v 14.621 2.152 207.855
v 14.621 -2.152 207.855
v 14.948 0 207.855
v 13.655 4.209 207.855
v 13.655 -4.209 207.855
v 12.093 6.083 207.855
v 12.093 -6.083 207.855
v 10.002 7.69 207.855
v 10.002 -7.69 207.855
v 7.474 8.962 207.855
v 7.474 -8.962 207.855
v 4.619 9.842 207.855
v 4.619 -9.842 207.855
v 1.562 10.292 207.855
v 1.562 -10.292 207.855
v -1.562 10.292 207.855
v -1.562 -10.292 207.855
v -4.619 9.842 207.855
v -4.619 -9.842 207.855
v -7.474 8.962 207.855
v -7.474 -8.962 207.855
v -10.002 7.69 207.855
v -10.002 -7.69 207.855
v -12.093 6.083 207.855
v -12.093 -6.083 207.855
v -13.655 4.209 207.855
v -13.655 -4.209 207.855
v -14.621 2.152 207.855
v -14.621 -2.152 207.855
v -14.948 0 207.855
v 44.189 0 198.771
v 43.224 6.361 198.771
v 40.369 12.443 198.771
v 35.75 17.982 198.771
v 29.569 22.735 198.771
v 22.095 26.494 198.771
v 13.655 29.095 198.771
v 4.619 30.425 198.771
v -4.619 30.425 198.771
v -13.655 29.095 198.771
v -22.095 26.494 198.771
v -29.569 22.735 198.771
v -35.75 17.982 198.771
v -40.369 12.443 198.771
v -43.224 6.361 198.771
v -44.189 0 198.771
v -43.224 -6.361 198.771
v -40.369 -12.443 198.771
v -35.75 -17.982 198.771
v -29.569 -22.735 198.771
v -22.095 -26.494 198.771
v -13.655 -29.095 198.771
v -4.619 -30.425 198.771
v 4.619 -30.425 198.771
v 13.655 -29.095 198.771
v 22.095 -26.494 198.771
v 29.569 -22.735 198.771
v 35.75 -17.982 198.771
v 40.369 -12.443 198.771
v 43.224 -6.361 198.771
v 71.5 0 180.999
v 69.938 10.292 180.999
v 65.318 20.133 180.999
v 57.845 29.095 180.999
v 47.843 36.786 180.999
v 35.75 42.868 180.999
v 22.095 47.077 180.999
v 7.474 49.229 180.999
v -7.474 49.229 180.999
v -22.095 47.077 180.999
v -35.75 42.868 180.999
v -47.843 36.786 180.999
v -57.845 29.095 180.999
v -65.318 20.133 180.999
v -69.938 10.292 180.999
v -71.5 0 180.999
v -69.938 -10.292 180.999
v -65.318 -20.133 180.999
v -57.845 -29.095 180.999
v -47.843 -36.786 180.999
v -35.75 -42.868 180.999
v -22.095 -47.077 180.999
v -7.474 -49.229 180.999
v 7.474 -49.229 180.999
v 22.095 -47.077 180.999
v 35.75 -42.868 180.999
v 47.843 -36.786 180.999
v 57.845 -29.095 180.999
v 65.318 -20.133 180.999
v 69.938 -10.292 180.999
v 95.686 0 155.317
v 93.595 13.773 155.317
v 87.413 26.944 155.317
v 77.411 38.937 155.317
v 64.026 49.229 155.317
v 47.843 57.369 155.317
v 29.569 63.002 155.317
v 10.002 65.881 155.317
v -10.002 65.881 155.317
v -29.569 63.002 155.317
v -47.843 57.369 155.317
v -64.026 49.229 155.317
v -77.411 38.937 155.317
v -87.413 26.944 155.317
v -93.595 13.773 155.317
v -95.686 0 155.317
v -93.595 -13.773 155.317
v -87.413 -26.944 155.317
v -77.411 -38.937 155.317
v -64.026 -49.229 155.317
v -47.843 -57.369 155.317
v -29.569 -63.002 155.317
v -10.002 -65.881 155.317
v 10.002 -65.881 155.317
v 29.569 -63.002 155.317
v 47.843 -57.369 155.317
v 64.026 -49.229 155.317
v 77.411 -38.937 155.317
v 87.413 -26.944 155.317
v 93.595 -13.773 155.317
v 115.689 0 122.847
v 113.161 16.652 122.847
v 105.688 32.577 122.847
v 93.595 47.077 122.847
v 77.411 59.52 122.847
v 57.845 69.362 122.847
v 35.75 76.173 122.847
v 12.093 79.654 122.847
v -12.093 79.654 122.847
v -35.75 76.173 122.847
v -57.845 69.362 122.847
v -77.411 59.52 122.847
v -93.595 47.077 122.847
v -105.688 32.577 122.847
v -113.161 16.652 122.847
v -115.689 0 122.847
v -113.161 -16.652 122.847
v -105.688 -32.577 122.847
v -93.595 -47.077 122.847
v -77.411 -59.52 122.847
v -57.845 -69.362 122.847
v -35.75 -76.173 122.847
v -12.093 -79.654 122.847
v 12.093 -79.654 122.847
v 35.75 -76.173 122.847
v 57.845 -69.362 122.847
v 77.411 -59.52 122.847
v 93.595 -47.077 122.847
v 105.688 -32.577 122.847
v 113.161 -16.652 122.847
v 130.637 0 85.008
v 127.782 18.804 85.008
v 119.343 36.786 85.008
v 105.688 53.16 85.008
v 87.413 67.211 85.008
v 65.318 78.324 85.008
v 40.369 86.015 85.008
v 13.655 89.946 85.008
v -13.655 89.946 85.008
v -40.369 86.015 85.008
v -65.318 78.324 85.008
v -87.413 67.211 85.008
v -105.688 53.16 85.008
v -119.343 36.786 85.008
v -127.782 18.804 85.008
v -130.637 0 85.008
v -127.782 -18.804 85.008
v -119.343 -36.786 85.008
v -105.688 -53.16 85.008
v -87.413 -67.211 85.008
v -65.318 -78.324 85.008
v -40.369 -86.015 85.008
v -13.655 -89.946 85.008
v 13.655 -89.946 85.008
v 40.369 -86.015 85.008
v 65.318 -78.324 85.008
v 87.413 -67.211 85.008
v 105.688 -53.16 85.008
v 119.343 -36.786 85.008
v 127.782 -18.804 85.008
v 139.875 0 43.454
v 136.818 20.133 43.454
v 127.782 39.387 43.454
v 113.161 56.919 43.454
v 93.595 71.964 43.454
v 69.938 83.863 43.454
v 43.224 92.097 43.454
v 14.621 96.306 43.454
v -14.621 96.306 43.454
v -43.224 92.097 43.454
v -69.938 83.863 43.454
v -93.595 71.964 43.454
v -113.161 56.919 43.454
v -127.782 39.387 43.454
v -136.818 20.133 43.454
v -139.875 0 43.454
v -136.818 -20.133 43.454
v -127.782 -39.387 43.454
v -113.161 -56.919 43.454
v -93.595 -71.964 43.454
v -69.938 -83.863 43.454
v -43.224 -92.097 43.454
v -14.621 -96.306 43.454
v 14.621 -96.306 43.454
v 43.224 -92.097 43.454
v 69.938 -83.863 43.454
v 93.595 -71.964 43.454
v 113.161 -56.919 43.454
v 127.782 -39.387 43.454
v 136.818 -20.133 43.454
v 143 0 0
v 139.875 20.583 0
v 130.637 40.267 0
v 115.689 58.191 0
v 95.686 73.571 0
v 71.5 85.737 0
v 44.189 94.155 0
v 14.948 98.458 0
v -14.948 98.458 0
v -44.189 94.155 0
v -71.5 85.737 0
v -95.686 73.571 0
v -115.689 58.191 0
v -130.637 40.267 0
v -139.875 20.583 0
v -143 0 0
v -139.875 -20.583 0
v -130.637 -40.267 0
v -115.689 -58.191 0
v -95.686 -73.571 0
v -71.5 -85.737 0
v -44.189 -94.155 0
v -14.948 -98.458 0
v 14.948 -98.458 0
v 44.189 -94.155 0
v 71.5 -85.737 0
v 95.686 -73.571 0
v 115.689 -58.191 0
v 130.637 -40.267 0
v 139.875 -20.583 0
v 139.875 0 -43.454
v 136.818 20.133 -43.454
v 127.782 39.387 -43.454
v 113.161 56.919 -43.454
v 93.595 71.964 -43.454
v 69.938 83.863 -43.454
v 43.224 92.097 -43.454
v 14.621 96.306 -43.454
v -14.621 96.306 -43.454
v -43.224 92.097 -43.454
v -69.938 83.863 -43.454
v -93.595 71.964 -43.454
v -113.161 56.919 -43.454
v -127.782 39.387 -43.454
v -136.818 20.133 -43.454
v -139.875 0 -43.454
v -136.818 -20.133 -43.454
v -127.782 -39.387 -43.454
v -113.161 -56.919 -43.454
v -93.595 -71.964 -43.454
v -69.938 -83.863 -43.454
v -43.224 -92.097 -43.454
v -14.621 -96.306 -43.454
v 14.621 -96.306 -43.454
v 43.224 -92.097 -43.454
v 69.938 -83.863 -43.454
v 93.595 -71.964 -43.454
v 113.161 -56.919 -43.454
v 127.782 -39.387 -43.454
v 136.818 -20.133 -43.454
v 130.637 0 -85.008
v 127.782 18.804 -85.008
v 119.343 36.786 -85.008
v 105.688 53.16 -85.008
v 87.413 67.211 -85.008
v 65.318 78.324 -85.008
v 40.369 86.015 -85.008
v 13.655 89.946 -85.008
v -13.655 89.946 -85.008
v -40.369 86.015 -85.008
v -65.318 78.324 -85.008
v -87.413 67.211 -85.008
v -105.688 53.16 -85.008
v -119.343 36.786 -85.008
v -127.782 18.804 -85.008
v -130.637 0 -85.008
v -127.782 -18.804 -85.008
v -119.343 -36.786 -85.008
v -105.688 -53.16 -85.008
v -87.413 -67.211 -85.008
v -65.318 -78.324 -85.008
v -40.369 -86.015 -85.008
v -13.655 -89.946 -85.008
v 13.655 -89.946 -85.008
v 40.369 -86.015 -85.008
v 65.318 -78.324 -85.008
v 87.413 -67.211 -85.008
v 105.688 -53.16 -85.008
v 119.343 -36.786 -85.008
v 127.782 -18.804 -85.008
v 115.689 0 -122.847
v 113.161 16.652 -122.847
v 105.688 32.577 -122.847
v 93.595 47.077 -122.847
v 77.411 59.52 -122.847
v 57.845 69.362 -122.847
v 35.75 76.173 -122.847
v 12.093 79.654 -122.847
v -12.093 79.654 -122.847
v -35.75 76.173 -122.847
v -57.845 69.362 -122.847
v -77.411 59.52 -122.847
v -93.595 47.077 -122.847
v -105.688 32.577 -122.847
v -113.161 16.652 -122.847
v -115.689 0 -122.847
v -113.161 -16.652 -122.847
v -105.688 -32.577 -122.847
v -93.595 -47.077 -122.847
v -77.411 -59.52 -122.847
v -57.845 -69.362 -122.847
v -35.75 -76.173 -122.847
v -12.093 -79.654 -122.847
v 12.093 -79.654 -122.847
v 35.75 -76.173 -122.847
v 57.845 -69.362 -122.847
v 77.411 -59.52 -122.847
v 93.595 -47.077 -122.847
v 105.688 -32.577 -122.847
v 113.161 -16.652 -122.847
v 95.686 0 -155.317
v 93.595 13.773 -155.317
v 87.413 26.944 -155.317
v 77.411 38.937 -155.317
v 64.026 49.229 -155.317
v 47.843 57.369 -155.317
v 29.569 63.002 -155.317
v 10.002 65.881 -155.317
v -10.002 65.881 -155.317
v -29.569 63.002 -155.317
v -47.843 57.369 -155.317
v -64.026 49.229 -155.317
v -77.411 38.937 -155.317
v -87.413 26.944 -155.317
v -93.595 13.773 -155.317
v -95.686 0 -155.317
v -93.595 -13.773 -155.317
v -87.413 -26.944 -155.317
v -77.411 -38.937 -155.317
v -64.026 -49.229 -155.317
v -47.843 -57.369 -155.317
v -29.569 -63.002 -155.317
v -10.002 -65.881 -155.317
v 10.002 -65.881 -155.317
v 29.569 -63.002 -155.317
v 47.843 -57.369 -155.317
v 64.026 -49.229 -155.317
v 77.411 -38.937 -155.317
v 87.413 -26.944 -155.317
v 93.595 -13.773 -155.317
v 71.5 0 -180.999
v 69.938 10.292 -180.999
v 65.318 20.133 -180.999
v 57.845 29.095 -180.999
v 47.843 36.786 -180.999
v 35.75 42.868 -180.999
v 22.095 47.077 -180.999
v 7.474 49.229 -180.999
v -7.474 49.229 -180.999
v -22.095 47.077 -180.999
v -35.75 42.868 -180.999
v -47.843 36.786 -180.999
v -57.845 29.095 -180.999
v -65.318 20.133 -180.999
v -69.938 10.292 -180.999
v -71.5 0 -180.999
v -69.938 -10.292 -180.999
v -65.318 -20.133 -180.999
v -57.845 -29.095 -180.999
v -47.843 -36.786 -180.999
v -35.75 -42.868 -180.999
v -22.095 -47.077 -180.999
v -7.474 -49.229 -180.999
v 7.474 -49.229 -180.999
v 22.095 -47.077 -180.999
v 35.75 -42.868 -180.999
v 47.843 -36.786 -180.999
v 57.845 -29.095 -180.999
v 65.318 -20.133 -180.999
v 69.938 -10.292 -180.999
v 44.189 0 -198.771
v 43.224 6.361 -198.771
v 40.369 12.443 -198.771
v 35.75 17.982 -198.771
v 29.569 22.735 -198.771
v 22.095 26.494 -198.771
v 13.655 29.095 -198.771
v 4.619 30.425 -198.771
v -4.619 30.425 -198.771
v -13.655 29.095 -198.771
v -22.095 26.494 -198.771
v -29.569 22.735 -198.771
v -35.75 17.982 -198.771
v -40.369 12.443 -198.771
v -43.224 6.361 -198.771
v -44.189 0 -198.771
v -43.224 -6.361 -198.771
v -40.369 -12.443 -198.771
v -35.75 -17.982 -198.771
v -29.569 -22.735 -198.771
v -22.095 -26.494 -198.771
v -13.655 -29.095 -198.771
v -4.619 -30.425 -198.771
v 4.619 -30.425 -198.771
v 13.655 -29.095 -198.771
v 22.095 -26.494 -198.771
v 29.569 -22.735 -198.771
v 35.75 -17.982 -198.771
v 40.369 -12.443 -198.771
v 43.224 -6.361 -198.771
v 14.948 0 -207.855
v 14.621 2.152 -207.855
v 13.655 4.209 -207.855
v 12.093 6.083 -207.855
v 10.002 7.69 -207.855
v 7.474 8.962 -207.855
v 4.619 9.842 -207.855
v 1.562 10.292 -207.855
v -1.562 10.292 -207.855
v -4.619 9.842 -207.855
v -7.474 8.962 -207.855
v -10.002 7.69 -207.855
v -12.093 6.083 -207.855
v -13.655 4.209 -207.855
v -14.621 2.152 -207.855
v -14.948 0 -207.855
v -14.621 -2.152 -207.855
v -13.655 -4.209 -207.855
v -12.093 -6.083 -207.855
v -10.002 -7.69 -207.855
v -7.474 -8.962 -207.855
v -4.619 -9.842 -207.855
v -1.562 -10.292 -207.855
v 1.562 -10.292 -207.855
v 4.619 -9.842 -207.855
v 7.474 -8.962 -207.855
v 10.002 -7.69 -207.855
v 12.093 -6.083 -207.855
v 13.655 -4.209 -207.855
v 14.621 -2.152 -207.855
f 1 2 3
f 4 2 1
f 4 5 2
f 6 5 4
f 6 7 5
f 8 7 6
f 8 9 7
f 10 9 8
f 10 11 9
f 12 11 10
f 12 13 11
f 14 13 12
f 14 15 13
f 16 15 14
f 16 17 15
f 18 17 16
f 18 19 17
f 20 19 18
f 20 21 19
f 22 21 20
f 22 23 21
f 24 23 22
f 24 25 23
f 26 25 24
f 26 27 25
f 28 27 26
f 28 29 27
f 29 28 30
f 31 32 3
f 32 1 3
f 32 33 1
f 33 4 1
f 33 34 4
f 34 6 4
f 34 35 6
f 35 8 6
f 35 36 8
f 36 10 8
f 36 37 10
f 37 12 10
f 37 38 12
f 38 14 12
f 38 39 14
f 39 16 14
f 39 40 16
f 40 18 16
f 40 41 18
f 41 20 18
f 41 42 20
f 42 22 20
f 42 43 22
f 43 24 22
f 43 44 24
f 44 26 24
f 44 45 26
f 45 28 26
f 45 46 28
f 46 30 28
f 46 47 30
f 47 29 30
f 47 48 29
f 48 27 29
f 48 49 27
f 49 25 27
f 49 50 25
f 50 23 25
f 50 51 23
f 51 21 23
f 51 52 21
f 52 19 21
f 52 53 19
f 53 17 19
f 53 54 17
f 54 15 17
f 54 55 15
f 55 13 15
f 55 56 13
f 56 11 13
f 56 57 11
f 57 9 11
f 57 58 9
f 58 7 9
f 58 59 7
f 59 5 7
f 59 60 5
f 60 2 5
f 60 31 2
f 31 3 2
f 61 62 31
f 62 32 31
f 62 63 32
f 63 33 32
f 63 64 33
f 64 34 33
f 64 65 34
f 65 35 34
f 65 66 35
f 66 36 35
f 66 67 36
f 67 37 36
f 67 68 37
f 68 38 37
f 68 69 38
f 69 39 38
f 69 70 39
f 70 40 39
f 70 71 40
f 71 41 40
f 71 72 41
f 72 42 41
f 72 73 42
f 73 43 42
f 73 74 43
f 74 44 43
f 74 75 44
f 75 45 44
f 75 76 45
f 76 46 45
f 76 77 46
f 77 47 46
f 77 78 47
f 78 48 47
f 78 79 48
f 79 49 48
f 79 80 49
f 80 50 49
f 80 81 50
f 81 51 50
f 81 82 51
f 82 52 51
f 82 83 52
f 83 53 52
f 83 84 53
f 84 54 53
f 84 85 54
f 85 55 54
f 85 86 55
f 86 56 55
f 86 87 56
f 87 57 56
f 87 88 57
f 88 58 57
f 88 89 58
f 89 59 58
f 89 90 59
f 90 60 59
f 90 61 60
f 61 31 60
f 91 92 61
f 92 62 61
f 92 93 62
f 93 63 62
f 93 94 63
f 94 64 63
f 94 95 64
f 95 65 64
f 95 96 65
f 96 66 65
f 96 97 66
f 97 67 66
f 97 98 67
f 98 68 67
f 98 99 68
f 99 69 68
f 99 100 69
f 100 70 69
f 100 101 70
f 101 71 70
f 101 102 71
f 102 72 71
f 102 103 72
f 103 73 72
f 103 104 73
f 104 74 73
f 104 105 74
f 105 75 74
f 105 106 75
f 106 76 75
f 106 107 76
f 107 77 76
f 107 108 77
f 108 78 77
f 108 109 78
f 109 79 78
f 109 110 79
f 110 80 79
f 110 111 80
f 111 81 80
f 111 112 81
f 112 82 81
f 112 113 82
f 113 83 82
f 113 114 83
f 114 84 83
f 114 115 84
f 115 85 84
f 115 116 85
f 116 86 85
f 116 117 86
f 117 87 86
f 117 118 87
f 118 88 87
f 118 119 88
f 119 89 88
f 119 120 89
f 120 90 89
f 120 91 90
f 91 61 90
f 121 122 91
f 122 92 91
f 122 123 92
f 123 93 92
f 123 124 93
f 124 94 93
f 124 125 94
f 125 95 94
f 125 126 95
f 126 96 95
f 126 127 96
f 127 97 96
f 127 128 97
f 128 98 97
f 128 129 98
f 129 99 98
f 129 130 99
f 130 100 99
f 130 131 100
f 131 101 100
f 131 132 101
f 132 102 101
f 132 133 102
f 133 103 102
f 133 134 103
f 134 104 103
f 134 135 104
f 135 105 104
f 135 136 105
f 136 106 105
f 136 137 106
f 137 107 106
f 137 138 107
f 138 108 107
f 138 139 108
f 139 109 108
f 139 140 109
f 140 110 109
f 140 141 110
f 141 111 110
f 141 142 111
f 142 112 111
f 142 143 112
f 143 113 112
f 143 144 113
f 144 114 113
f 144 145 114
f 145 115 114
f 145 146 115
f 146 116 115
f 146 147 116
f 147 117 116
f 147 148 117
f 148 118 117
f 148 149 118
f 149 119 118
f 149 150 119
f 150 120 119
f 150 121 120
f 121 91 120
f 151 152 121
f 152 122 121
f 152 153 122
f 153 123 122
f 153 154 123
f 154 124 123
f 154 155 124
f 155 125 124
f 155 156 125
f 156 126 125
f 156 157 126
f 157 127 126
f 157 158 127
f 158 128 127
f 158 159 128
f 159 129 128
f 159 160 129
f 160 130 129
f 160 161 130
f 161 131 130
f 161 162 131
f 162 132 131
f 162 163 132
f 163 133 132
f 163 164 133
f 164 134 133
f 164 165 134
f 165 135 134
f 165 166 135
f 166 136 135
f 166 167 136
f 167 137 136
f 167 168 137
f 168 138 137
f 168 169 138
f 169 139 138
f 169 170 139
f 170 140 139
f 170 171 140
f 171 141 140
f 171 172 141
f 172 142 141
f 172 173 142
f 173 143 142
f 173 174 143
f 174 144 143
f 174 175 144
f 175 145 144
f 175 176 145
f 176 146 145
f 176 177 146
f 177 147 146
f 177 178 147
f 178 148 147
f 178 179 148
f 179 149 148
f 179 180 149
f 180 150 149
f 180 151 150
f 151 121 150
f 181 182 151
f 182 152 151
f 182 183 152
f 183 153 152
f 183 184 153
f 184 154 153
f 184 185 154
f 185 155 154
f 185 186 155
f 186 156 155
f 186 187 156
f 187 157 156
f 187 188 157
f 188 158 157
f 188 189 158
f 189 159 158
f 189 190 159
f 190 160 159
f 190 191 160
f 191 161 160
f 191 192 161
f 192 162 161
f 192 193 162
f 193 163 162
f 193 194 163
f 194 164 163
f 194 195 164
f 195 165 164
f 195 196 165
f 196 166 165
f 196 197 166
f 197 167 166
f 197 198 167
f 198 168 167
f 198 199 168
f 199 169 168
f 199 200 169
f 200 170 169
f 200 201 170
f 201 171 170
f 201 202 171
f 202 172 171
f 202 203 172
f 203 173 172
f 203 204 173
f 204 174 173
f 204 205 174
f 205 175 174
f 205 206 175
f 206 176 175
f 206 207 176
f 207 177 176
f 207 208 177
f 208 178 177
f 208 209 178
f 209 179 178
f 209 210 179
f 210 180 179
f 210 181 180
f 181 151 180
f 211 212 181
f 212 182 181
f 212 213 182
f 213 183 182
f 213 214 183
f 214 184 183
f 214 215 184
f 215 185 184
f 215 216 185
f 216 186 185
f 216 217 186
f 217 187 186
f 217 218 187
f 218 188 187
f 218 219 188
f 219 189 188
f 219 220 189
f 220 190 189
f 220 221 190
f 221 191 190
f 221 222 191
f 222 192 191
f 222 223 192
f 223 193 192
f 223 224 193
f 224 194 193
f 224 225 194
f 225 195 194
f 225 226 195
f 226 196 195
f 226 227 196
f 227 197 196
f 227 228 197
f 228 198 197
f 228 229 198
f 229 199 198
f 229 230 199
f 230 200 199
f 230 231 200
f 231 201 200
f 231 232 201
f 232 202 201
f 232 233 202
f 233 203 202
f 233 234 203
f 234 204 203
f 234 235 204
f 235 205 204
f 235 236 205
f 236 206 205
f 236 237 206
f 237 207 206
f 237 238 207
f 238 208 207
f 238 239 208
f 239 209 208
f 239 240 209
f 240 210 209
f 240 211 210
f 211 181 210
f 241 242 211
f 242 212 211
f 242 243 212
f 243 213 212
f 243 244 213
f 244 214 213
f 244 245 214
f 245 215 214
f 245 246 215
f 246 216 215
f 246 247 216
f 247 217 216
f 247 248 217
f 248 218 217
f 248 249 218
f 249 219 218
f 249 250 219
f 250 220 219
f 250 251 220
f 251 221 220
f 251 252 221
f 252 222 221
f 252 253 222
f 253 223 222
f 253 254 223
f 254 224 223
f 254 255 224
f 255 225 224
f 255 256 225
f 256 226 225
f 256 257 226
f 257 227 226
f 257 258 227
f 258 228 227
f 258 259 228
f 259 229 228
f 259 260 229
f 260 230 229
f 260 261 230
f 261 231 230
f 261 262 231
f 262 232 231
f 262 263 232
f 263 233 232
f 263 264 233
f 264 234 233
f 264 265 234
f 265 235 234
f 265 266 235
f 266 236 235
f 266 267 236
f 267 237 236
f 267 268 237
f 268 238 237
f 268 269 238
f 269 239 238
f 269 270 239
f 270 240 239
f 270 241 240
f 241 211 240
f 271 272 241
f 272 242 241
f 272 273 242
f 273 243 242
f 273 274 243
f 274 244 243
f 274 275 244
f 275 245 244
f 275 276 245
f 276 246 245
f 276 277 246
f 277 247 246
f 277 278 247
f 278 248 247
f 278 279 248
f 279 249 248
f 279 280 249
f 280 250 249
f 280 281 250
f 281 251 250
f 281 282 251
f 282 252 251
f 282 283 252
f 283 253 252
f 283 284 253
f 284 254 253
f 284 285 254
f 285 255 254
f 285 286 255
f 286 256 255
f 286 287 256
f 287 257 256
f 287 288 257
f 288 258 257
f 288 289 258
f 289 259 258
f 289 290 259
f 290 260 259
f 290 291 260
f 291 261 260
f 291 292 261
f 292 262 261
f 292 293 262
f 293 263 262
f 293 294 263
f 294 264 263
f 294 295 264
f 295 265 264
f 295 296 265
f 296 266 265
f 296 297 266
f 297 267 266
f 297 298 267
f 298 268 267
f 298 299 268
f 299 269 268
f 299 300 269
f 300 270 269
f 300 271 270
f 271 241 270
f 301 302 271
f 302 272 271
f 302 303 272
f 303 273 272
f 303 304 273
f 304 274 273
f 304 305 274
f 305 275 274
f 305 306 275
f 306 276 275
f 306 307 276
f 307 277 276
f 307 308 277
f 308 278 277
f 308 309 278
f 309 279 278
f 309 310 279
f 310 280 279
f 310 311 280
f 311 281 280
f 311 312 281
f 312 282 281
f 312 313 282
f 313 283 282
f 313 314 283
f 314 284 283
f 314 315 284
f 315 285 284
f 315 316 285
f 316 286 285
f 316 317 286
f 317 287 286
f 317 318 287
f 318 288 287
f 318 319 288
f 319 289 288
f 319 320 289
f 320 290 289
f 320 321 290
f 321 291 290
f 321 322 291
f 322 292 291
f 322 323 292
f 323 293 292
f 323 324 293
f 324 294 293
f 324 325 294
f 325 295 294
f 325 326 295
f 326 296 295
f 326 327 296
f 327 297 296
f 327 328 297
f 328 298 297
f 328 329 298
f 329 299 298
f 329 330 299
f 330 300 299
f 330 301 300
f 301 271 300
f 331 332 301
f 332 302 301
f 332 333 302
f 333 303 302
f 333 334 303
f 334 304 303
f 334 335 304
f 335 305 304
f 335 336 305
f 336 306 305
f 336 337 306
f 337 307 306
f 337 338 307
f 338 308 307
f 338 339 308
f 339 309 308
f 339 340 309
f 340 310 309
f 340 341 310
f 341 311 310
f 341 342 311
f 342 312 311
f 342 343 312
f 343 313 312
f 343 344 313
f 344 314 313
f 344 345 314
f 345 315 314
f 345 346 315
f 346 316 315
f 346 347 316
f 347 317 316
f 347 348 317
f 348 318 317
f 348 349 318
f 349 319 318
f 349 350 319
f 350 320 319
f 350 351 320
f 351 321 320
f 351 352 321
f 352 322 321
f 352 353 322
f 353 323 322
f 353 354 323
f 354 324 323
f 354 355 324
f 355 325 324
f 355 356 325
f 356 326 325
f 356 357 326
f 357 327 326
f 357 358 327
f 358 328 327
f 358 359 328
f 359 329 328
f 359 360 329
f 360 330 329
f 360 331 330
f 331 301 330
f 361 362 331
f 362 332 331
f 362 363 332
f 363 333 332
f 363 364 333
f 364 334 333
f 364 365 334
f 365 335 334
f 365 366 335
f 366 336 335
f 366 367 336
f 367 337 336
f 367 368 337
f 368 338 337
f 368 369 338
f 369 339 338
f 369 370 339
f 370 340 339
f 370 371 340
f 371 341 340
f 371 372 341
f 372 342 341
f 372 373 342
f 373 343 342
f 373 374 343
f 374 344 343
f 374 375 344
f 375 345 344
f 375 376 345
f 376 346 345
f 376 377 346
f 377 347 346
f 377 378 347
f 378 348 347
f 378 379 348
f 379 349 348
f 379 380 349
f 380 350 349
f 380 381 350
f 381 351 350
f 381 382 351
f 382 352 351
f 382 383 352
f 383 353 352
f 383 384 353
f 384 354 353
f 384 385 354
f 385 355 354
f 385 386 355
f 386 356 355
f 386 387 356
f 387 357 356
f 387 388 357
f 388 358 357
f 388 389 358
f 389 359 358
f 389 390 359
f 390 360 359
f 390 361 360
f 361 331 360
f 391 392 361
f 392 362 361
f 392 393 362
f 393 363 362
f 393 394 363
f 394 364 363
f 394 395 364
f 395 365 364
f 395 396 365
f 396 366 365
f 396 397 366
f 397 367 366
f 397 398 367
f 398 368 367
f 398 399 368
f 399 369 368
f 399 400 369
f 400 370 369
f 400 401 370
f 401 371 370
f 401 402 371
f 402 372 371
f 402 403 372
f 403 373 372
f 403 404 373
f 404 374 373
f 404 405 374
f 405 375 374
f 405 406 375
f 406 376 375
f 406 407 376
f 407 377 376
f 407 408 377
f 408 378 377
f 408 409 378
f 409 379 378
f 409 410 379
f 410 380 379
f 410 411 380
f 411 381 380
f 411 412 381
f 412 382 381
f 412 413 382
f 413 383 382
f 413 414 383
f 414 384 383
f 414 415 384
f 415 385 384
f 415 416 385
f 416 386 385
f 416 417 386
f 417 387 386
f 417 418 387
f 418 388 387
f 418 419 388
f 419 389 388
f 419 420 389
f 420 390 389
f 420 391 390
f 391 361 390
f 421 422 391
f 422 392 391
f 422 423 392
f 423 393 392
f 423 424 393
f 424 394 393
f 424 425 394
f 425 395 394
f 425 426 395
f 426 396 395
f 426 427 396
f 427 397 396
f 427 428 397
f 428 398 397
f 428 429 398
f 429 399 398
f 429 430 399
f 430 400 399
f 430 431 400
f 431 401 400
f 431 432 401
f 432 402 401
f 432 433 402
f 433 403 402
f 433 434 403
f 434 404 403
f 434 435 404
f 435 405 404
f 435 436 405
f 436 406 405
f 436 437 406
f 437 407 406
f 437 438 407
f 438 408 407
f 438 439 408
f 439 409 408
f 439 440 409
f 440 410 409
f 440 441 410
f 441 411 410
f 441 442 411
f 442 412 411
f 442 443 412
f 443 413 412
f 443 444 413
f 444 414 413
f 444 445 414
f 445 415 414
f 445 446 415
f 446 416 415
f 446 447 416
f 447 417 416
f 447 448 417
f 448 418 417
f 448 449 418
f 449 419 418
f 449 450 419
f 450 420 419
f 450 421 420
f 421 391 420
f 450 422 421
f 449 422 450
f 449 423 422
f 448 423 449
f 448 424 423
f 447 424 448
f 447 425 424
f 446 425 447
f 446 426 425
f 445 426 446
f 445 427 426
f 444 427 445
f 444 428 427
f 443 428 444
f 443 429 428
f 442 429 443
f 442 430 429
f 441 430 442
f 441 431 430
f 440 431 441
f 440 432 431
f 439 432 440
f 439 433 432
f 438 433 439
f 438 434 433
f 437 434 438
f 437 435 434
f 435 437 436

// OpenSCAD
// Generated by SolidPython 1.0.1 on 2020-07-29 00:46:50


scale(v = [13, 9, 19]) {
	sphere(r = 11);
}
/***********************************************
*********      SolidPython code:      **********
************************************************
 
# import packages: SolidPython
from solid import *
from solid.utils import *
from itertools import chain, combinations, permutations


class Resize:

    def __init__(self, scad_file):
        self.scad_file = scad_file
        #self.scad_file = import_scad(scad_file)
        # cone/cylinder param:
        self.r1 = 0
        self.r2 = 0
        self.h = 0
        # rectangular prism param:
        self.w = 0
        self.l = 0
        # ellipse param:
        self.r = 0

    # import OpenScad code (file name corresponds to shape)


    # classify shape + parameters
    def assign(self, param1, param2, param3):
        if self.scad_file == 'cone.scad':
            self.r1 = param1
            self.r2 = param2
            self.h = param3
        elif self.scad_file == 'cylinder.scad':
            self.r1 = param1
            self.r2 = param2
            self.h = param3
        elif self.scad_file == 'rectangularPrism.scad':
            self.h = param1
            self.l = param2
            self.w = param3
        else:
            self.r = param1
            self.h = param2

    # resize parameters
    def iterate(self):
        x = range(3, 20, 2)
        i = 1
        if self.scad_file == 'cone.scad':
            tempList = list(permutations(x, 2))
            for temp in tempList:
                param1 = temp[0]
                param2 = temp[1]
                filepath = 'produced_scad_files/' + 'cone' + str(param1) + '_' + str(param2) + '_' + '.scad'
                scad_render_to_file(cylinder(h=param1, r1=param2, r2=0), filepath)

        elif self.scad_file == 'cylinder.scad':
            tempList = list(permutations(x, 3))
            for temp in tempList:
                param1 = temp[0]
                param2 = temp[1]
                filepath = 'produced_scad_files/' + 'cylinder' + str(param1) + '_' + str(param2) + '_' + '.scad'
                scad_render_to_file(cylinder(h=param1, r1=param2, r2=param2), filepath)

        elif self.scad_file == 'rectangularPrism.scad':
            tempList = list(permutations(x, 3))
            for temp in tempList:
                param1 = temp[0]
                param2 = temp[1]
                param3 = temp[2]
                filepath = 'produced_scad_files/' + 'rectangularPrism' + str(param1) + '_' + str(param2) + '_' + str(
                    param3) + '.scad'
                scad_render_to_file(cube(size=(param1, param2, param3)), filepath)

        elif self.scad_file == 'ellipse.scad':
            tempList = list(permutations(x, 4))
            for temp in tempList:
                param1 = temp[0]
                param2 = temp[1]
                param3 = temp[2]
                param4 = temp[3]
                filepath = 'produced_scad_files/' + 'ellipse' + str(param1) + '_' + str(param2) + '_' + str(param3) + '_' + str(param4) + '.scad'
                scad_render_to_file(scale([param1, param2, param3])(sphere(r=param4)), filepath)

    def render_to_scadfile(self):
        scad_render_to_file(scad, 'example.scad') 
 
************************************************/
